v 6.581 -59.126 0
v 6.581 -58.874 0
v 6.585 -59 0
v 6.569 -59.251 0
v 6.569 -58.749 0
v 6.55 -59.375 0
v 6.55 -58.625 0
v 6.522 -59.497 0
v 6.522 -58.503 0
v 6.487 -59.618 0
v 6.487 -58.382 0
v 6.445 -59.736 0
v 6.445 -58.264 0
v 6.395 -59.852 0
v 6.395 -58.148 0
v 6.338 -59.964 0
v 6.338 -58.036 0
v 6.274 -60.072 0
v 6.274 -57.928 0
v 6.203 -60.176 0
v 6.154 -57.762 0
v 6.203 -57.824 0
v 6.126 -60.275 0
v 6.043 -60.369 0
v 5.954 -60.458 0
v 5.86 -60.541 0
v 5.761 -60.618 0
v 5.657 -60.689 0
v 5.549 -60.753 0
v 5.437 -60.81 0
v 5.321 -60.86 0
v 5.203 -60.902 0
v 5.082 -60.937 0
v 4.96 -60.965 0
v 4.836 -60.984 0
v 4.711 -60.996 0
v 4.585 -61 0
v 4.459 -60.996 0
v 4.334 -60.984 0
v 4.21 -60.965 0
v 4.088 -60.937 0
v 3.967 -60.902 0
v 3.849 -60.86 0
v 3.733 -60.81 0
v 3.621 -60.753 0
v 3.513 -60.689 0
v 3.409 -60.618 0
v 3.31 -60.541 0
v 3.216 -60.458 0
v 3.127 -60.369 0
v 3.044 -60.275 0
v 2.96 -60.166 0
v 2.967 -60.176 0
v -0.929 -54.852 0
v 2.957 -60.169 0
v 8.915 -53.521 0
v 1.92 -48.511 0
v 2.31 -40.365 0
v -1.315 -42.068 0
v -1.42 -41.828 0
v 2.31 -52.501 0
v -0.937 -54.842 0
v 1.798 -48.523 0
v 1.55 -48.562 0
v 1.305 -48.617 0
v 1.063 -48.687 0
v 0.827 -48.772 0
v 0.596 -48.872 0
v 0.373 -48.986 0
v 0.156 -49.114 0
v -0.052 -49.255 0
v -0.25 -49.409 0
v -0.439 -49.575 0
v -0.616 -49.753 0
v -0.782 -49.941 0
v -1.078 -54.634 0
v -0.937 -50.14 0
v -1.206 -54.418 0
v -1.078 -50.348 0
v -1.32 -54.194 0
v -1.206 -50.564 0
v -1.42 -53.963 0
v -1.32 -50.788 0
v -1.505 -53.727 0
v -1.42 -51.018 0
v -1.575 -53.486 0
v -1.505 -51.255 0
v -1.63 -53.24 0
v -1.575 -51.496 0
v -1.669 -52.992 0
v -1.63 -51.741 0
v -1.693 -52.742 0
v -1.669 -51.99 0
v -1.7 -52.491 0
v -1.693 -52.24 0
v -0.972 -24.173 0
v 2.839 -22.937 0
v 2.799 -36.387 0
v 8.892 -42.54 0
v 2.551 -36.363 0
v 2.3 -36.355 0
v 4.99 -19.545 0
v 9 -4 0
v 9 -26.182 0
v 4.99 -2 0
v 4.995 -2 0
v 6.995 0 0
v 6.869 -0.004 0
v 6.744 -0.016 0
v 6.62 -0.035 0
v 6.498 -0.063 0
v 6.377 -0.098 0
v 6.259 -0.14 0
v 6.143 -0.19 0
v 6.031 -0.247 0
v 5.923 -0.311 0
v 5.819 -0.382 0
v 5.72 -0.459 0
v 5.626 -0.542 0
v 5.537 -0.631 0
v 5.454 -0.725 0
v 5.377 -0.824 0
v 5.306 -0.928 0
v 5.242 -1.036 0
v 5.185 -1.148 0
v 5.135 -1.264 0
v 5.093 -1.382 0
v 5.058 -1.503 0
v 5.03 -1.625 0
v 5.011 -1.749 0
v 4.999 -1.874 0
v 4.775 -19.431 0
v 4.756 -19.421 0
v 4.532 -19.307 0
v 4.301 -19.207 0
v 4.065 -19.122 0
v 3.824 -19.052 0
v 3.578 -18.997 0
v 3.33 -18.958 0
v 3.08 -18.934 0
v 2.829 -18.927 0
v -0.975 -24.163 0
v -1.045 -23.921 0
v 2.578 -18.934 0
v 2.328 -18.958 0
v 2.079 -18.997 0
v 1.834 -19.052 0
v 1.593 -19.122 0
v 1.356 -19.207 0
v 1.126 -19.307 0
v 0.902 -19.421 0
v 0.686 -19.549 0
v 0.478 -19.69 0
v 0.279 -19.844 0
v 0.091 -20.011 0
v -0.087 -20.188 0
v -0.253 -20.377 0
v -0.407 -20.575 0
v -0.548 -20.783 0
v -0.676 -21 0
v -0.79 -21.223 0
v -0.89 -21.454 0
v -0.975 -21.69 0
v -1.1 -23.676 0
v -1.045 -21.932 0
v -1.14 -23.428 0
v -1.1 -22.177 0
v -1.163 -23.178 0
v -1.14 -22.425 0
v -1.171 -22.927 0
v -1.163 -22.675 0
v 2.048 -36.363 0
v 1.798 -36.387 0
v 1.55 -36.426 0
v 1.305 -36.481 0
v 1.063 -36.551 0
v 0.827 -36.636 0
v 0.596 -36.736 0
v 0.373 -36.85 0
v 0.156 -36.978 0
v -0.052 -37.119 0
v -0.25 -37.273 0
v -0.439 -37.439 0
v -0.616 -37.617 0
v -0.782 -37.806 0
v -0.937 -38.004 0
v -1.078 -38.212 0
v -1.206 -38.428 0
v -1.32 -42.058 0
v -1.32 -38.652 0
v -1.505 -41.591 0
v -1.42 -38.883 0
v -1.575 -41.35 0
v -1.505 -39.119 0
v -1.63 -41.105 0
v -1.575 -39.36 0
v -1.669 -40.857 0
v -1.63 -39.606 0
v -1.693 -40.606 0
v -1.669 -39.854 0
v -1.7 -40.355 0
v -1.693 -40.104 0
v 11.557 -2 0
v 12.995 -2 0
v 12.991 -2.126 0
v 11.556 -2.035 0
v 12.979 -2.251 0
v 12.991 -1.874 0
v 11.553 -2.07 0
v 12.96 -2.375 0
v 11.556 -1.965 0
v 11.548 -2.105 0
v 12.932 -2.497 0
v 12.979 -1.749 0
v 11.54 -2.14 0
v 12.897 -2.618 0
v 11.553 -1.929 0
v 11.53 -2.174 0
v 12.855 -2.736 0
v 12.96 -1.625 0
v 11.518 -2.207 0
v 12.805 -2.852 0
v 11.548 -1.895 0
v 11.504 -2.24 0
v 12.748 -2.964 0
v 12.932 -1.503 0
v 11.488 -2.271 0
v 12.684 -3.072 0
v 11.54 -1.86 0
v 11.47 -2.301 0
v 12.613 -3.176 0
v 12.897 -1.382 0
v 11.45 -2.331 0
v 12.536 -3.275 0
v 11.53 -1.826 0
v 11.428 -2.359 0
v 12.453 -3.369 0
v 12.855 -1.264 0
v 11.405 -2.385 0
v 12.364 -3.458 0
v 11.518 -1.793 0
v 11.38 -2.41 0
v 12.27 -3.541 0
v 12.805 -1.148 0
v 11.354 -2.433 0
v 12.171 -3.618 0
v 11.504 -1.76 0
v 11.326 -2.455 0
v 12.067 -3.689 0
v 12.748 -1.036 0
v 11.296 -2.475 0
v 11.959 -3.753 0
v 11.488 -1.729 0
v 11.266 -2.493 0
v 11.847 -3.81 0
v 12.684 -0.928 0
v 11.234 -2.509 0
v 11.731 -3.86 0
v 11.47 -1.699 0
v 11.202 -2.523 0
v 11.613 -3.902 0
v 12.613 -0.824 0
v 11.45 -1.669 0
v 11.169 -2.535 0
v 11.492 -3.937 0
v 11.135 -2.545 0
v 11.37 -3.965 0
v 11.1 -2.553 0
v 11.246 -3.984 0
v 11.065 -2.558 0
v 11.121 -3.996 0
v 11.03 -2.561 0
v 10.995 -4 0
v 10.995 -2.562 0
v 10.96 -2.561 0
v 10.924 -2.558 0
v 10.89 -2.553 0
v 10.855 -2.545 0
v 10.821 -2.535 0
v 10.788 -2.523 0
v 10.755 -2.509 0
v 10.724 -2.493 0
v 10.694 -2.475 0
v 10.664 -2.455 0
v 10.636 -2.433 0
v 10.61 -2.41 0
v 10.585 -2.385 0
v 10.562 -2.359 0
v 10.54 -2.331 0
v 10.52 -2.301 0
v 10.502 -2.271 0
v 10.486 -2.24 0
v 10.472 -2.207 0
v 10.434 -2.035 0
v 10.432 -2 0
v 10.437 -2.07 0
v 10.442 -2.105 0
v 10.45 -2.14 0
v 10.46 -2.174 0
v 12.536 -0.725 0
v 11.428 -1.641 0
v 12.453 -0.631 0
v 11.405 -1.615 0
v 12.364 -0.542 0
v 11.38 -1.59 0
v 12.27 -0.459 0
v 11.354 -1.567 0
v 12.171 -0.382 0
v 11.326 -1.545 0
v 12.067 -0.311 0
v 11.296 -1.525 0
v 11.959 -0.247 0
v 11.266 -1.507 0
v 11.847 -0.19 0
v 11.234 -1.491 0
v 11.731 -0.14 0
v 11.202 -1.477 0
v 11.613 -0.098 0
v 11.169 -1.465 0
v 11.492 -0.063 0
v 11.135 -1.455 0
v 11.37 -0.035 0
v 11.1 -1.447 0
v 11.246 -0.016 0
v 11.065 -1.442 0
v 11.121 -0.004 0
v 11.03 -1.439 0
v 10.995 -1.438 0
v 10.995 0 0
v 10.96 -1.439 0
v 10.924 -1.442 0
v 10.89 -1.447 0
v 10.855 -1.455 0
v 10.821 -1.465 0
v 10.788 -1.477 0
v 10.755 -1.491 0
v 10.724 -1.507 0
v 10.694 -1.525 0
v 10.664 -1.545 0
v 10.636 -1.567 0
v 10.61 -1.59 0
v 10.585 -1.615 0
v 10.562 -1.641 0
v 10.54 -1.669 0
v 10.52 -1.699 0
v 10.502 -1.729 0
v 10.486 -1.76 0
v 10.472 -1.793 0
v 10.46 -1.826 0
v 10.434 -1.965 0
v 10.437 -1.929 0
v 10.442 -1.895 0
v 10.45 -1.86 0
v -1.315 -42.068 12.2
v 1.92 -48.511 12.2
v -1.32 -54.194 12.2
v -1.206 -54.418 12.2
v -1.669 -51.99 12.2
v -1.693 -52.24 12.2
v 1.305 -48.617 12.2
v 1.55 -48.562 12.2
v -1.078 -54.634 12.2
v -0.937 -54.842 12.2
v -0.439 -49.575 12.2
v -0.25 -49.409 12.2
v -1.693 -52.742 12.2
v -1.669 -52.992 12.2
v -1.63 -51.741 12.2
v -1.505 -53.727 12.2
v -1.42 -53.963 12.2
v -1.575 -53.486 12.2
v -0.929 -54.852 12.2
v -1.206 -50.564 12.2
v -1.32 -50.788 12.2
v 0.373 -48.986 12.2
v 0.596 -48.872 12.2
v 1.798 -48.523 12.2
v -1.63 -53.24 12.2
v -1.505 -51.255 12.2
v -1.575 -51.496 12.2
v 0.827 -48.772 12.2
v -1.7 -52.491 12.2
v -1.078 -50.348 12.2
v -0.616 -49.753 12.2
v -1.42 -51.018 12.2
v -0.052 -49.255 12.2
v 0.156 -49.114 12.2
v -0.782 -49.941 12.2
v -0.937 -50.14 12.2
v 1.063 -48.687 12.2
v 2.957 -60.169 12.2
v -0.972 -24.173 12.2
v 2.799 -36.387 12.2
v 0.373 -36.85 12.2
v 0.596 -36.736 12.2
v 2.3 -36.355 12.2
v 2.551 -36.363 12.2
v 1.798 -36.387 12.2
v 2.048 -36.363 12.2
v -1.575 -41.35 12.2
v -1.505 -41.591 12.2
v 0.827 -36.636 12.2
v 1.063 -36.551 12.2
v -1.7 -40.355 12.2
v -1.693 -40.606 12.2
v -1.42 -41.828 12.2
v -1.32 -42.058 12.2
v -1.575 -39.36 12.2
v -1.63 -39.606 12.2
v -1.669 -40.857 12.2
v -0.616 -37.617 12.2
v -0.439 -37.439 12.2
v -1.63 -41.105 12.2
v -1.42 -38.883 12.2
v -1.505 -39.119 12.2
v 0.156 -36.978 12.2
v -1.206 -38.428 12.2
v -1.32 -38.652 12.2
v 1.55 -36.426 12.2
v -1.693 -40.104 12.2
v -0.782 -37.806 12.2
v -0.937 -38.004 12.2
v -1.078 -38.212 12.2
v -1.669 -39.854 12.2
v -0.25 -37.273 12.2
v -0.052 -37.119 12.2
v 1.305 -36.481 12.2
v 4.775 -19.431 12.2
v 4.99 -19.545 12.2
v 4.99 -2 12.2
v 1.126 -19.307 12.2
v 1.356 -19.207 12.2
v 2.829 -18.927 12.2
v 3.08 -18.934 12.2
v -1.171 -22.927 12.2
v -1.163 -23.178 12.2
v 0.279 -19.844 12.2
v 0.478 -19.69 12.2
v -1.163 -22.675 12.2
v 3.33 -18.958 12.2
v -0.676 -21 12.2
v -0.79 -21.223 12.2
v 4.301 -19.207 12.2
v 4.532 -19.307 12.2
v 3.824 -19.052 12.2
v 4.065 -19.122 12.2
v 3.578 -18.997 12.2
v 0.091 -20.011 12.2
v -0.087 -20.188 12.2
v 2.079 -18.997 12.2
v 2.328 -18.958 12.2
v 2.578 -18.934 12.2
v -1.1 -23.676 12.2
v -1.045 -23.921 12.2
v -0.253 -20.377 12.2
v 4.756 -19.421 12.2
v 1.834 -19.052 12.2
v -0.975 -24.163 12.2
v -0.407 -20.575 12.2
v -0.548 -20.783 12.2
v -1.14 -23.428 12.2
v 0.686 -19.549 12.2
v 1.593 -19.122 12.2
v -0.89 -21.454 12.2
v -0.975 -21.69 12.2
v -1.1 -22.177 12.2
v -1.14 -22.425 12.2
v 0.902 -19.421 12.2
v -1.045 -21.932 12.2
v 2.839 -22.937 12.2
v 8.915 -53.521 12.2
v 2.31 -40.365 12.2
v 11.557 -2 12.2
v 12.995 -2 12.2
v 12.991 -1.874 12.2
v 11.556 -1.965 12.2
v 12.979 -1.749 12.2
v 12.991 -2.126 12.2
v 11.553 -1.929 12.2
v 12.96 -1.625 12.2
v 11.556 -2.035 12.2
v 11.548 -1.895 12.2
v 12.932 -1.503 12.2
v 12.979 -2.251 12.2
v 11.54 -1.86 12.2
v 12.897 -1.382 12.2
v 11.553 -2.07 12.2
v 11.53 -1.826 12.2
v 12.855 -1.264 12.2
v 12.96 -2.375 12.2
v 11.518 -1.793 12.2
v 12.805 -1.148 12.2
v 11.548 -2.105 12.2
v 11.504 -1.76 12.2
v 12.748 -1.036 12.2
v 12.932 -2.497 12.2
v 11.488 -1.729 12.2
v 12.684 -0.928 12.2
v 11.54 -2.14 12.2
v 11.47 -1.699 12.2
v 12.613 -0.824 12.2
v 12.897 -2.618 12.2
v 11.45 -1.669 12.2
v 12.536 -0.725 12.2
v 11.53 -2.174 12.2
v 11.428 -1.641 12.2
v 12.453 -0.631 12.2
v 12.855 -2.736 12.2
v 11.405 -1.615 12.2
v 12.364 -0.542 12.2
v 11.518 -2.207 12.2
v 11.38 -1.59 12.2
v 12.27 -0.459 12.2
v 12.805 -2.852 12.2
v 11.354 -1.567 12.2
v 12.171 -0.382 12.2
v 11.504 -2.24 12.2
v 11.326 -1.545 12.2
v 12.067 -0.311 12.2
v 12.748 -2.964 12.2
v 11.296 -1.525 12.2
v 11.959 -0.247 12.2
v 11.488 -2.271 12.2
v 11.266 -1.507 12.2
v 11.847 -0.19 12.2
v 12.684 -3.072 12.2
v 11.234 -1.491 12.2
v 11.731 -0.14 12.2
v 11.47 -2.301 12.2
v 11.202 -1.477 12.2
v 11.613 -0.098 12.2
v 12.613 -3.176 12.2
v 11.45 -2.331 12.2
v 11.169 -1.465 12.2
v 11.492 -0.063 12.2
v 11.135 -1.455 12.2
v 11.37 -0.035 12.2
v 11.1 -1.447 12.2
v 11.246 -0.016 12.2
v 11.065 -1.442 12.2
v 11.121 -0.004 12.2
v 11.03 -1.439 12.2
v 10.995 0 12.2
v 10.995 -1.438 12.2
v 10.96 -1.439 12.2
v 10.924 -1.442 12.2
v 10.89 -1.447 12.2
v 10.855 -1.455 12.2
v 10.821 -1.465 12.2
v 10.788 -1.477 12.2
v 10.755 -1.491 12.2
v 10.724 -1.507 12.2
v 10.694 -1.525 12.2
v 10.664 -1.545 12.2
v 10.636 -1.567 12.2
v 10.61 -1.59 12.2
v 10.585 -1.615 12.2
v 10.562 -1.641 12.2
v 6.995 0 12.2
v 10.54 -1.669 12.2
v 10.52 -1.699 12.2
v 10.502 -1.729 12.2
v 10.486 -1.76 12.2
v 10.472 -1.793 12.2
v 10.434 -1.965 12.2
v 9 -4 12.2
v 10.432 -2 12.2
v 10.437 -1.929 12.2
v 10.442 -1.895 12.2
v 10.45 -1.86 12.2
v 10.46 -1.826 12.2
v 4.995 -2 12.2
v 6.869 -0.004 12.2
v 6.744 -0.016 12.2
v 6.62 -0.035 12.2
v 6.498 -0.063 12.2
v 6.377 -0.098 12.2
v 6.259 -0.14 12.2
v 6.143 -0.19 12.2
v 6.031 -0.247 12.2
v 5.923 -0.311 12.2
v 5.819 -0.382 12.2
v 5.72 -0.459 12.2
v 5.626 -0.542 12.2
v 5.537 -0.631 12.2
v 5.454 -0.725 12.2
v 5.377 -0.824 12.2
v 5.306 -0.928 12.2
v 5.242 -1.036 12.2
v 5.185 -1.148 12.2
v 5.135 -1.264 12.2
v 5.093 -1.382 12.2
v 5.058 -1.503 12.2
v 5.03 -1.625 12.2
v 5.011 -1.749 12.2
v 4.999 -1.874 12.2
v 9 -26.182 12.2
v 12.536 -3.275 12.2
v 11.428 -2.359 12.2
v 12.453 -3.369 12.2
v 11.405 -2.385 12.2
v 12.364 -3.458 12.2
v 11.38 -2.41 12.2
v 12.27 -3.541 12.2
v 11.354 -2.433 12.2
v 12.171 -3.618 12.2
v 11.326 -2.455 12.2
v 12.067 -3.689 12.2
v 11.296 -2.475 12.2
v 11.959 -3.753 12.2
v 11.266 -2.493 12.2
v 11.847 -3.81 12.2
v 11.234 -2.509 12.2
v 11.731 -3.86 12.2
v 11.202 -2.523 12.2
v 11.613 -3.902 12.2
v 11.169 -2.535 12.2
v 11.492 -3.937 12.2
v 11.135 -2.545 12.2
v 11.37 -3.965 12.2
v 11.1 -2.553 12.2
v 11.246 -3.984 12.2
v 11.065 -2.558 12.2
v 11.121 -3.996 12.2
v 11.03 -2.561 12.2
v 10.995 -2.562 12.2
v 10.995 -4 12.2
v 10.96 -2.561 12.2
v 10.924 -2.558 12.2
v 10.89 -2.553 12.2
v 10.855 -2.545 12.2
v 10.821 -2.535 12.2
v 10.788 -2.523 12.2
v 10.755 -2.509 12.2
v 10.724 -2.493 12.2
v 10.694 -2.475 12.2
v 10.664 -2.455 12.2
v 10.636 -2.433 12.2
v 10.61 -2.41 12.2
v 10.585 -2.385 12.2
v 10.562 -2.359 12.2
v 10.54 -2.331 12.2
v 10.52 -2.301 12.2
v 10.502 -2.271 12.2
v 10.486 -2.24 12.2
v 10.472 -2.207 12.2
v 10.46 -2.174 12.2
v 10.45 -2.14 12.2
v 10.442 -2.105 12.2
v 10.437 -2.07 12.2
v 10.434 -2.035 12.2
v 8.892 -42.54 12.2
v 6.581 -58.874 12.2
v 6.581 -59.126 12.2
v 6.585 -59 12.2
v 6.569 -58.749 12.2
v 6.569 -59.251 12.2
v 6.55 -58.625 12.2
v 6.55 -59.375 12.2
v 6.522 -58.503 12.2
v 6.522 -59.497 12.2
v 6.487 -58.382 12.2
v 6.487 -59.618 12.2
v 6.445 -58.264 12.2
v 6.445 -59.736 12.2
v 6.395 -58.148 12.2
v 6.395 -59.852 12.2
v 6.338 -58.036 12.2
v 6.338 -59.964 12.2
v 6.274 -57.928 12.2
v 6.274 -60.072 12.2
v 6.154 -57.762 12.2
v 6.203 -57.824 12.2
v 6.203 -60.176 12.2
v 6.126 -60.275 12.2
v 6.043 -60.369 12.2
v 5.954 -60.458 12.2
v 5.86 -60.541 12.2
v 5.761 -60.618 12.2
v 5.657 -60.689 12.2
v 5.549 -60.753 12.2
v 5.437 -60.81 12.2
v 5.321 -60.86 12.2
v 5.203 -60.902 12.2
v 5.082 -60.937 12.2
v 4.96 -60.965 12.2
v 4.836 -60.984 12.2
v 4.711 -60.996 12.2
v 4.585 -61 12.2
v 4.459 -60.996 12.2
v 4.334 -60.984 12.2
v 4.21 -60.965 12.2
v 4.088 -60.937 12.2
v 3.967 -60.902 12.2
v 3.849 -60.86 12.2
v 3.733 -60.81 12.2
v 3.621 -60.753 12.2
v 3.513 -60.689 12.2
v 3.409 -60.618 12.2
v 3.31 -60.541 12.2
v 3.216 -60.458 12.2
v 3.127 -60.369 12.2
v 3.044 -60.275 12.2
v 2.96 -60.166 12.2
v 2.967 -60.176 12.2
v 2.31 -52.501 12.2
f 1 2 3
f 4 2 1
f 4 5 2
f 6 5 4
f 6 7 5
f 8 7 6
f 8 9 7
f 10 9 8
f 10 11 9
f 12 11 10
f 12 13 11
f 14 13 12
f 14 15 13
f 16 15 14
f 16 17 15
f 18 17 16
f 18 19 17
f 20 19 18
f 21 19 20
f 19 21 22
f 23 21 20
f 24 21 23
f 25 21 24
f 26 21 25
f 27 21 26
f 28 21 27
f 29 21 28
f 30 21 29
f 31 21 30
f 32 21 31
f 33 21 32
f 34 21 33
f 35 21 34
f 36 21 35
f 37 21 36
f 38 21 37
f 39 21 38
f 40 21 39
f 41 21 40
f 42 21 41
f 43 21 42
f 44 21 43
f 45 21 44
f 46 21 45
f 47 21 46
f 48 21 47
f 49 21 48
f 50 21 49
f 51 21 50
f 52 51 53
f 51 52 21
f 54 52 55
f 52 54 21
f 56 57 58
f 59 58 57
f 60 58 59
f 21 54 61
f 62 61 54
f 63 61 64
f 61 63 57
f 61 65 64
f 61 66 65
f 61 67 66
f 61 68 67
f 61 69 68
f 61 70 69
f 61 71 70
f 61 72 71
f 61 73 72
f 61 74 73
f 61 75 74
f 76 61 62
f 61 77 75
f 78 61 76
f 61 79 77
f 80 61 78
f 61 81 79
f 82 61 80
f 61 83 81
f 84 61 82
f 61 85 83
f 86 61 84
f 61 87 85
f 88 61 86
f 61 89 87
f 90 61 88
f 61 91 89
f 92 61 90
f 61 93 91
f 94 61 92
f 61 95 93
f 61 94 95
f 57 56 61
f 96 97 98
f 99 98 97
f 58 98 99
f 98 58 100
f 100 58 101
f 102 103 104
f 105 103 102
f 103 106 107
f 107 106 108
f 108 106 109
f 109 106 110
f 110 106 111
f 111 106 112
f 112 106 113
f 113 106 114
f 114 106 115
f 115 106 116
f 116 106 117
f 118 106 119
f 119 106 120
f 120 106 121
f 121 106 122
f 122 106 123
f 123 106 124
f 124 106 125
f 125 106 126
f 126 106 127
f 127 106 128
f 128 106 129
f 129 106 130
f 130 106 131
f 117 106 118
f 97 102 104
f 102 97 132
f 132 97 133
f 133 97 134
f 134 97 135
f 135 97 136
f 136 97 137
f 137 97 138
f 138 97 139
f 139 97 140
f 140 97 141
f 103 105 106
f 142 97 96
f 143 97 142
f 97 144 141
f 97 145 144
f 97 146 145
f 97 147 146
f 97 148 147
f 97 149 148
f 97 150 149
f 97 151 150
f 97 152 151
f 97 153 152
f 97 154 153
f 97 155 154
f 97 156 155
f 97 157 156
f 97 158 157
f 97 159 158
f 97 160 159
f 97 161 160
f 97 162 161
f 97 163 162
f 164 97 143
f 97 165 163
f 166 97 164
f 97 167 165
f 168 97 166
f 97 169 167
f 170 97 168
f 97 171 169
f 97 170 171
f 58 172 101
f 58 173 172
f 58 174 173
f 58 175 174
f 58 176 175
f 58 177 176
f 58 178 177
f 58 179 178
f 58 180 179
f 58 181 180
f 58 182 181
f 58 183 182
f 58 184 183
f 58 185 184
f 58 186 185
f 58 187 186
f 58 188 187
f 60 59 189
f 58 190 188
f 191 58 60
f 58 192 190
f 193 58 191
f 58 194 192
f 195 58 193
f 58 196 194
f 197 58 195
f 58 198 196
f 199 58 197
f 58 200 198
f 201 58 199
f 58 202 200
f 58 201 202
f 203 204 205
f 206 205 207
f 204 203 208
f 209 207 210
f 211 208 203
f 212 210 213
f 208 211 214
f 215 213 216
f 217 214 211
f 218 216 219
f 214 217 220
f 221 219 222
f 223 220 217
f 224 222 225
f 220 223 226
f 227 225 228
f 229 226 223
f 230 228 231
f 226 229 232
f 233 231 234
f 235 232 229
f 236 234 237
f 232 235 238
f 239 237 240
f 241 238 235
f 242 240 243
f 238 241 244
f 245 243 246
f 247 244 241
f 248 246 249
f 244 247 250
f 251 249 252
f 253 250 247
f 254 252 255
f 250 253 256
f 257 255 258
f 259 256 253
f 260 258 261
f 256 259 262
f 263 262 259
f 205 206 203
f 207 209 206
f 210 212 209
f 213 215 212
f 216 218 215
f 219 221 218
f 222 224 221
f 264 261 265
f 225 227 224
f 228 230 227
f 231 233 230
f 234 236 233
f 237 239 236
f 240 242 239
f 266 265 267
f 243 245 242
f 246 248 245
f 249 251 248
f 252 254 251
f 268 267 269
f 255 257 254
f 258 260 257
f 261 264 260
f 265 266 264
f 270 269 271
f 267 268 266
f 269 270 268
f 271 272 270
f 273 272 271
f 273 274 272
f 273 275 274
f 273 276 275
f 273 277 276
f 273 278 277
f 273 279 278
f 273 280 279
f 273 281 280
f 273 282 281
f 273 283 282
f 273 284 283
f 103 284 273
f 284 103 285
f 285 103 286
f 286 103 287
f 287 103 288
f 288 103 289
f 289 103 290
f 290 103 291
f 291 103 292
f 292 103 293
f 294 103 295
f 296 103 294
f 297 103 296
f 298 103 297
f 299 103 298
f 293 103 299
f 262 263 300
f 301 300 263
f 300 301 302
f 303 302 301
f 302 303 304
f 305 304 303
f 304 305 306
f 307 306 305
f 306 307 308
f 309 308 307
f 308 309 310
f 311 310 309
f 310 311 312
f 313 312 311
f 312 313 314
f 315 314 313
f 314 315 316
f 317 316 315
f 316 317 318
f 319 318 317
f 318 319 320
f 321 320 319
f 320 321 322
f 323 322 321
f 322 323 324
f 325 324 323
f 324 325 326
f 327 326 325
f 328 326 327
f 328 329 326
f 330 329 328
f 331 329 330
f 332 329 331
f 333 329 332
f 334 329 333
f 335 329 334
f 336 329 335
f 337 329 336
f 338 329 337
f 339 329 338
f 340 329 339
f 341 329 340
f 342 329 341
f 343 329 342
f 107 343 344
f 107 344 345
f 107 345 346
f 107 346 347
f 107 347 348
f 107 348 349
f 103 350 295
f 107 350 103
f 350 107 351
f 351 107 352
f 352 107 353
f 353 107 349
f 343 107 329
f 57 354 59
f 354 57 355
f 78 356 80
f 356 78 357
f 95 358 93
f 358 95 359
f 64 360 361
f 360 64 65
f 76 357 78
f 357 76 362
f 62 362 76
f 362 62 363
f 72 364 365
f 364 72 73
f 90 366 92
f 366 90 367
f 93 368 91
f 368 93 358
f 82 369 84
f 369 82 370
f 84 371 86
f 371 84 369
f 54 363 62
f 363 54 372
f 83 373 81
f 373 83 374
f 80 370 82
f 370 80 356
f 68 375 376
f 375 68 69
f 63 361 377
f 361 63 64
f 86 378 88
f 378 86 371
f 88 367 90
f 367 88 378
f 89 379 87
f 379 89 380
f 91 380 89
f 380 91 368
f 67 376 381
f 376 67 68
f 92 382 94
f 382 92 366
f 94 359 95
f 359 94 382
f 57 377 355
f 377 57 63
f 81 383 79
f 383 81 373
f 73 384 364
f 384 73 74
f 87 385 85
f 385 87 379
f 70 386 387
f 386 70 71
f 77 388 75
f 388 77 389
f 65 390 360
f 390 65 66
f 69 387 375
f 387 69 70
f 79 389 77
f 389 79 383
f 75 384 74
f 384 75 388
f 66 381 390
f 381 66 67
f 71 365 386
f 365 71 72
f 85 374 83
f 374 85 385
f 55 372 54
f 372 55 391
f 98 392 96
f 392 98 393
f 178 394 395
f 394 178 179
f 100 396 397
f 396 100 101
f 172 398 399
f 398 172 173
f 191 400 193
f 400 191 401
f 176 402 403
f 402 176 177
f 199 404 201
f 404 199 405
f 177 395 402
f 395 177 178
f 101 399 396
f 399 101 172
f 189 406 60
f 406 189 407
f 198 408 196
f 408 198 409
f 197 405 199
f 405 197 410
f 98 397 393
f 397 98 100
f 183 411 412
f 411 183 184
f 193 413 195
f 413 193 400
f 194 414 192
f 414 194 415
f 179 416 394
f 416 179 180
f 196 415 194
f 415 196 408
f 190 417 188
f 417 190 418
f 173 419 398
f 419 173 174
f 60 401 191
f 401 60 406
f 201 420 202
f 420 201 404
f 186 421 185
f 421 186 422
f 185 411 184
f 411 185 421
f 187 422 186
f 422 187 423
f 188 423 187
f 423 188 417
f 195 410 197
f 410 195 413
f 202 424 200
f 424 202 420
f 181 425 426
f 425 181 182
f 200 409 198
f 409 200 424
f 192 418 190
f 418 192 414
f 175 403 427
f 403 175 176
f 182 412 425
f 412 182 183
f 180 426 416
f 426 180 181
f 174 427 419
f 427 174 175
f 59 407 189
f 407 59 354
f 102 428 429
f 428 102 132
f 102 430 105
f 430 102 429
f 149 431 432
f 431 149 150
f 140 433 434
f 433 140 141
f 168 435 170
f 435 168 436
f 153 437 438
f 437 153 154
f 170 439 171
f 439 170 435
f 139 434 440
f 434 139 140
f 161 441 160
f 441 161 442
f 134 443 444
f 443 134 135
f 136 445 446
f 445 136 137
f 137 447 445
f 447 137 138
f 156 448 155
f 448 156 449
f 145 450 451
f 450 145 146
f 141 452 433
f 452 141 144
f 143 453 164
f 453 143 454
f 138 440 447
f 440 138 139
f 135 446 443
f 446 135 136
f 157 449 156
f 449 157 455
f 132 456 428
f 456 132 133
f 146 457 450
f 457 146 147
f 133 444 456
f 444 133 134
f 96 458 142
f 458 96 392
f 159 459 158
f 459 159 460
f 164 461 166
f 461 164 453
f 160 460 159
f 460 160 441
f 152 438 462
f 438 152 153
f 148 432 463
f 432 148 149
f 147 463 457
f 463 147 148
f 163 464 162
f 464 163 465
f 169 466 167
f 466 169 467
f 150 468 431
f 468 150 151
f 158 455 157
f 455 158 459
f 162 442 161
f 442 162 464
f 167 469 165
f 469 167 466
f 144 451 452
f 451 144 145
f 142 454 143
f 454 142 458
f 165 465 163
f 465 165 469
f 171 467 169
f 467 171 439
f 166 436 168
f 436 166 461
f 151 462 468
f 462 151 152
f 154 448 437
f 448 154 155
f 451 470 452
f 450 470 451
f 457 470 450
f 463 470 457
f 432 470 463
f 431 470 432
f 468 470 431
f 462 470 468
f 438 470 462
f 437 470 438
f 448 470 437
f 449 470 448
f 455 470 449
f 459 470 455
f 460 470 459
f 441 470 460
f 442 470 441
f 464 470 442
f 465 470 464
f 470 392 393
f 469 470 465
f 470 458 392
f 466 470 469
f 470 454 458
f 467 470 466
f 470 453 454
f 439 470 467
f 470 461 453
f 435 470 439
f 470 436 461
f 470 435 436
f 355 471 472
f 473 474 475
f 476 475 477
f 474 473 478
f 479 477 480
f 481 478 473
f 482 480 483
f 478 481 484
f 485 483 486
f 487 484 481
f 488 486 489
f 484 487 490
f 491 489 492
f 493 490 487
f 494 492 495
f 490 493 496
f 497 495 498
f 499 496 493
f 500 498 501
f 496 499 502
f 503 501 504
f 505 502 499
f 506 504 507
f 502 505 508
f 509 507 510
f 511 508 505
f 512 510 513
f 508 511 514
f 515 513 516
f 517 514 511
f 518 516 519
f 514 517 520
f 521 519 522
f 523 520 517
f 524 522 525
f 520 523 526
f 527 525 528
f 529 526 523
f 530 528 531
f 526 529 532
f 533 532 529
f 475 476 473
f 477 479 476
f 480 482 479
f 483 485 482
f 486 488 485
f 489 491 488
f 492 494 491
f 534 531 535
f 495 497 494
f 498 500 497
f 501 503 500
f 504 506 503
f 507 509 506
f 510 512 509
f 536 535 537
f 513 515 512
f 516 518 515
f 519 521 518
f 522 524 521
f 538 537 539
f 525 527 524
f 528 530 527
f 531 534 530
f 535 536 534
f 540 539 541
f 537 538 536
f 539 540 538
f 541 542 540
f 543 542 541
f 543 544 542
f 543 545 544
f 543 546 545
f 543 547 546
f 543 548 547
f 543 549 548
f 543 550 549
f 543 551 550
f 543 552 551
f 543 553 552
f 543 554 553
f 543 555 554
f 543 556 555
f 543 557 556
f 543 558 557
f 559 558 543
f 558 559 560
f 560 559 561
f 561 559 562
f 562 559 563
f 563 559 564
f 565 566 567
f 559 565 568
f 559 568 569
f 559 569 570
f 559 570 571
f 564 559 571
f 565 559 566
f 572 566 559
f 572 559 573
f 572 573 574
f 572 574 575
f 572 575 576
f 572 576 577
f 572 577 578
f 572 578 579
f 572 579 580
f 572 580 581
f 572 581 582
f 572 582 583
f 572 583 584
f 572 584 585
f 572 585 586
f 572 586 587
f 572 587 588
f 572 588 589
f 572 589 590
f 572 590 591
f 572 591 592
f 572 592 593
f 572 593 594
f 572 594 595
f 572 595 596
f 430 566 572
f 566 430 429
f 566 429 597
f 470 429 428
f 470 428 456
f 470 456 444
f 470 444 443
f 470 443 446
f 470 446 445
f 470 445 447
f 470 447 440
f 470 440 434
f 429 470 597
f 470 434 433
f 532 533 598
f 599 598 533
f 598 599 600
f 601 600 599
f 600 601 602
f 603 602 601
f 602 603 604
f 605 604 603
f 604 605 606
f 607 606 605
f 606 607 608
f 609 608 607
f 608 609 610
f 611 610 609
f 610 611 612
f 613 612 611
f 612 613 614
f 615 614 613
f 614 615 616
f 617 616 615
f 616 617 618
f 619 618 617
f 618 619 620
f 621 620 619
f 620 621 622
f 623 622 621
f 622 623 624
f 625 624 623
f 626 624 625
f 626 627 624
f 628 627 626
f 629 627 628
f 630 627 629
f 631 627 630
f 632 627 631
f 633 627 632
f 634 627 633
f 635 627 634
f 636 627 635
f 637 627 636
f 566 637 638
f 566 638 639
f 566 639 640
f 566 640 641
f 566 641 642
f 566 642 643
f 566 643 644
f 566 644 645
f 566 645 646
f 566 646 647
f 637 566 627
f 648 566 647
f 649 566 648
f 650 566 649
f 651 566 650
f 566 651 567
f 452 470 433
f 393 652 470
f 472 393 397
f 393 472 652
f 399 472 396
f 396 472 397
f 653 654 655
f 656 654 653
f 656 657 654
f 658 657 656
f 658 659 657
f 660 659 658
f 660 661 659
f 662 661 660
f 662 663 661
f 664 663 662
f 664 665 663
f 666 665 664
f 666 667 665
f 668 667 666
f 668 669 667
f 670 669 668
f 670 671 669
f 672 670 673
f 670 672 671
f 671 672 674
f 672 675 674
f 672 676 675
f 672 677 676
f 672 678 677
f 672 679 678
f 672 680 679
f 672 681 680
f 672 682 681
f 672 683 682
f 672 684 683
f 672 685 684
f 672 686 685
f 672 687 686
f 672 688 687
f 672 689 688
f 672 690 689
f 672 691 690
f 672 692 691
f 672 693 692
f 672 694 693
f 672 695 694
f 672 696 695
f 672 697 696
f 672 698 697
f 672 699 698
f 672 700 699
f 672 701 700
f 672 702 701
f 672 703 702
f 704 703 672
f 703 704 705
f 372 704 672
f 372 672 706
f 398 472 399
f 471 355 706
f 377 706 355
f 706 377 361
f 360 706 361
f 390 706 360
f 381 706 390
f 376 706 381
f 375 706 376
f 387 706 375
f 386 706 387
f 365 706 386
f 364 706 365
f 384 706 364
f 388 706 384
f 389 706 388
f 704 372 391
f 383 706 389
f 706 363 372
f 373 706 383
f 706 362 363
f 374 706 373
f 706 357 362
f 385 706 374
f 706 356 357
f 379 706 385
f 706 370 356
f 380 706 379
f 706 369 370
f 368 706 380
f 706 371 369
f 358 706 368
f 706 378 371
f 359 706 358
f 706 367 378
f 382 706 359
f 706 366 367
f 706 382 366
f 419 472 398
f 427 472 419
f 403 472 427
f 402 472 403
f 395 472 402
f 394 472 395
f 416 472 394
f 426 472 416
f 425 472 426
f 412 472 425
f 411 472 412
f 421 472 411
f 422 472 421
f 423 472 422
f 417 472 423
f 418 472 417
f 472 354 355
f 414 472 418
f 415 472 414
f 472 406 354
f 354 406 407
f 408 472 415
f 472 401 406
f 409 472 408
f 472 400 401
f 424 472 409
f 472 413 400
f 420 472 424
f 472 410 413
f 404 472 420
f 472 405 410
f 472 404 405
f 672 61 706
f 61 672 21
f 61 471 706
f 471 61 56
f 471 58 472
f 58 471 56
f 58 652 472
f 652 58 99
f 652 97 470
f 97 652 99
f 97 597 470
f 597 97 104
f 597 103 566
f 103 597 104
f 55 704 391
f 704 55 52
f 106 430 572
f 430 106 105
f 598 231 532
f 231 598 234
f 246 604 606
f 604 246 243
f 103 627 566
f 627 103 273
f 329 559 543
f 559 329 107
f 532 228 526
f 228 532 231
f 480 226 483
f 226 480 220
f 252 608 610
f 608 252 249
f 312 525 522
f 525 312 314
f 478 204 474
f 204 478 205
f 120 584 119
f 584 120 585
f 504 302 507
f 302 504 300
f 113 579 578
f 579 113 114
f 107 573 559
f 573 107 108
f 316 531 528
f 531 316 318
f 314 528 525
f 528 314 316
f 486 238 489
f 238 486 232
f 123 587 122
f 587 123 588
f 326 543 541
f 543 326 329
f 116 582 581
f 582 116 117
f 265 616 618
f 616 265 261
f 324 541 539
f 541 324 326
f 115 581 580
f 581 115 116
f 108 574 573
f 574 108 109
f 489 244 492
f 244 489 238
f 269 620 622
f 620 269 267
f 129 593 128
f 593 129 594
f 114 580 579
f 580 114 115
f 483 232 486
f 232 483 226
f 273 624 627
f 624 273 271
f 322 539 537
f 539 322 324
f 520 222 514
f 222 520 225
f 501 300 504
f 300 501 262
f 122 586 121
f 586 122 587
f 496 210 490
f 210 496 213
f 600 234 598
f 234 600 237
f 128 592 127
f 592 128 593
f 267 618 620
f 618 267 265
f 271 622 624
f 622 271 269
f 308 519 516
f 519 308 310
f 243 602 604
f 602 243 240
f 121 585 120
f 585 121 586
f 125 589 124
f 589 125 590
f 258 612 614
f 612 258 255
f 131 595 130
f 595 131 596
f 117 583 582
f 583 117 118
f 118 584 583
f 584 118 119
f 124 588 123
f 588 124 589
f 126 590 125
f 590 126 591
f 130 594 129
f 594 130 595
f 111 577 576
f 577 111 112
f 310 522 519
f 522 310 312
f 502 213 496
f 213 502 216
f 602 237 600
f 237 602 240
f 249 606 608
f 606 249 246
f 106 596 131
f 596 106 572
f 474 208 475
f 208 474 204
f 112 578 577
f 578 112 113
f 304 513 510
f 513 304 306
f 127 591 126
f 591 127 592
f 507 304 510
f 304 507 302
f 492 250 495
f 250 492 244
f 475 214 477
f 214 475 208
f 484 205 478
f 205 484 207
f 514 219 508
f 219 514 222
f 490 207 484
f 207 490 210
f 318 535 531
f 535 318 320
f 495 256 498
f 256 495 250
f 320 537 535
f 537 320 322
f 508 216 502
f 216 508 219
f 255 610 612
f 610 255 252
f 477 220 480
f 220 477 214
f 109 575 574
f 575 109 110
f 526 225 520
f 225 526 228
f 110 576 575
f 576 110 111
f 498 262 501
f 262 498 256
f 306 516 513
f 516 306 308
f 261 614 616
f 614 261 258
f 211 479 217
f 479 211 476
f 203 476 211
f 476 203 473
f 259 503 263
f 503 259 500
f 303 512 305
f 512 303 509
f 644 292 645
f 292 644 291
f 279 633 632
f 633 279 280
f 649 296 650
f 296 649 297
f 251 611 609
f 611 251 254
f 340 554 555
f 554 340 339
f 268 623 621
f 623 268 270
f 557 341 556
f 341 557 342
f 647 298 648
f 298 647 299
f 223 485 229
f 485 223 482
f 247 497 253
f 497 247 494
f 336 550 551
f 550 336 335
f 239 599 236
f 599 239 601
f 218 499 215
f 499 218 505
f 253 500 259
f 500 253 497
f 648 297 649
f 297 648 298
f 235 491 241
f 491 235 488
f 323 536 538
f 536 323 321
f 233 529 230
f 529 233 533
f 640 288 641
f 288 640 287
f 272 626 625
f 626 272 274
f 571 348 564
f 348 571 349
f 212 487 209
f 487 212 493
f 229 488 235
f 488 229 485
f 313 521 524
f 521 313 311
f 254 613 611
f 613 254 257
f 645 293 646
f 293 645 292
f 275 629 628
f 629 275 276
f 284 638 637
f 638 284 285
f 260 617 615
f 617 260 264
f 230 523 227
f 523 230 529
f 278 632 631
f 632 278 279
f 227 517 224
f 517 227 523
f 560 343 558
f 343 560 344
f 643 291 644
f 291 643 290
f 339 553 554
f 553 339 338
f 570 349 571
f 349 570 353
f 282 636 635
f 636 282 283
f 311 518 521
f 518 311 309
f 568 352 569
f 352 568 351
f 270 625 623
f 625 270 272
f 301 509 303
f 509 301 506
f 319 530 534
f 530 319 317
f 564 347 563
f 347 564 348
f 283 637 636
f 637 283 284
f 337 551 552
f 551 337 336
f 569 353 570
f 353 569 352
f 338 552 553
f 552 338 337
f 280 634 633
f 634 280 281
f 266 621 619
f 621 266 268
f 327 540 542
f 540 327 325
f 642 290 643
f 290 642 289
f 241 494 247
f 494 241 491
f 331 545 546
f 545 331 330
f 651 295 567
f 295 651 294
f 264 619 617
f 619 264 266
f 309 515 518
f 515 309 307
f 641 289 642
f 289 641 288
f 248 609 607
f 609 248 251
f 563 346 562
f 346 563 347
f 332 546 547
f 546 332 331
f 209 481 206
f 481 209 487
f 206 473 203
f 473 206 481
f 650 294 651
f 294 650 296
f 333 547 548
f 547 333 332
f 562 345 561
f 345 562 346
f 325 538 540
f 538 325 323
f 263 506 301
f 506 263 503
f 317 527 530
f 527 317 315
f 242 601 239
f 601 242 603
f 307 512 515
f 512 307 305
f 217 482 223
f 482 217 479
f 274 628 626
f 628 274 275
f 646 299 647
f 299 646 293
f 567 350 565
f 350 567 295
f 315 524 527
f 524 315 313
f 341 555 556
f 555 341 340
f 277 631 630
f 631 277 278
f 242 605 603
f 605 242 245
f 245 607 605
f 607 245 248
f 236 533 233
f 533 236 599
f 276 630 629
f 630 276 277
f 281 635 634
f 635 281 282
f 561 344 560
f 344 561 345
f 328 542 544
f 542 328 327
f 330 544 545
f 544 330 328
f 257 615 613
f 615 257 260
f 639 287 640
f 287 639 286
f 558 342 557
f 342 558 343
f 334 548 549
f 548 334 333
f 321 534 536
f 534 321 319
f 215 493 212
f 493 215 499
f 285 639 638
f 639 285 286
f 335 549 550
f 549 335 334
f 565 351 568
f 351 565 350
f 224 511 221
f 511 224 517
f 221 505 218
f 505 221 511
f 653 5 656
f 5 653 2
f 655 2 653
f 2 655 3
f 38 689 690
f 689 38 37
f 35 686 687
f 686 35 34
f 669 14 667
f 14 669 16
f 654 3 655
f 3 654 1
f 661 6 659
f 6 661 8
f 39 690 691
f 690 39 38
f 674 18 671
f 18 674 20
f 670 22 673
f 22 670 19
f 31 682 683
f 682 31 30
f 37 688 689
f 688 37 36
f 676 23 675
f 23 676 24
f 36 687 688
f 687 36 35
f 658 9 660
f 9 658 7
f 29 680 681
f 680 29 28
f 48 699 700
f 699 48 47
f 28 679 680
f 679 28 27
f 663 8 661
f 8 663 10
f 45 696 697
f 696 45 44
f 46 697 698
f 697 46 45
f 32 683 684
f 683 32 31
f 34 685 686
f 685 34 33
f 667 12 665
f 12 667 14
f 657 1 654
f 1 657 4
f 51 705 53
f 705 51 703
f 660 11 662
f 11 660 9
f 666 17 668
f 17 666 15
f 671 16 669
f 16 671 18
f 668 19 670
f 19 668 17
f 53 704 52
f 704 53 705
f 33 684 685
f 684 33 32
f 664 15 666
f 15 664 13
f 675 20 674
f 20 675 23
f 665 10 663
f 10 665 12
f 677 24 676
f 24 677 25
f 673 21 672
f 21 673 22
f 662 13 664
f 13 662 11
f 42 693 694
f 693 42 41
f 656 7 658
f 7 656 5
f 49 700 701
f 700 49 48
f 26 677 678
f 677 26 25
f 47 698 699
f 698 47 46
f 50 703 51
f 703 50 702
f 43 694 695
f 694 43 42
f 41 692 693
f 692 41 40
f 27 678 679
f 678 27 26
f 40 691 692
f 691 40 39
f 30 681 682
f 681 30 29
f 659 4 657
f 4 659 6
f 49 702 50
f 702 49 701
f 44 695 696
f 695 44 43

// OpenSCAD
H      = 12.2;
D      =  4;
AXIS_D =  1.125;

ATOM   =  0.01;
$fn    = $preview?9:100;

module shape() {
    translate([0, -297, 0])
    import("lever.dxf");
}


module skeleton() {
    linear_extrude(H)
    difference() {
        shape();
        d = 0.01;
        translate([-d, d, 0])
        shape();

        translate([-.1, -69 - 1+.2])
        square(10);
    }
}

module lever() {
    intersection() {
        minkowski() {
            skeleton();
            cylinder(d=D*2, ATOM);
        }

        union() {
            linear_extrude(H)
            shape();
            translate([-5+1, -60, 0])
            cube([5, 60, H]);
        }
        
        // cut bottom
        translate([-5, -66.84 + 1.1, 0])
        rotate([0, 0, 35])
        cube([100, 70, H]);
        
        // cut top
        translate([-6, -70 - D/2, 0])
        cube([60, 70, H]);
    }

    // end
    translate([4.68 +.15 -.245, -59, 0])
    cylinder(d=D, h=H, $fn=100);

    // elbow
    x = 5.235 - .24  + 2;
    x2 = x+D;
    difference() {
        hull() {
            translate([x, -D/2, 0])
            cylinder(d=D, h=H, $fn=100);

            translate([x2, -D/2, 0])
            cylinder(d=D, h=H, $fn=100);
        }
        
        translate([x2, -D/2, 0])
        cylinder(d=AXIS_D, h=H*3, center=true);
    }
}

lever();
